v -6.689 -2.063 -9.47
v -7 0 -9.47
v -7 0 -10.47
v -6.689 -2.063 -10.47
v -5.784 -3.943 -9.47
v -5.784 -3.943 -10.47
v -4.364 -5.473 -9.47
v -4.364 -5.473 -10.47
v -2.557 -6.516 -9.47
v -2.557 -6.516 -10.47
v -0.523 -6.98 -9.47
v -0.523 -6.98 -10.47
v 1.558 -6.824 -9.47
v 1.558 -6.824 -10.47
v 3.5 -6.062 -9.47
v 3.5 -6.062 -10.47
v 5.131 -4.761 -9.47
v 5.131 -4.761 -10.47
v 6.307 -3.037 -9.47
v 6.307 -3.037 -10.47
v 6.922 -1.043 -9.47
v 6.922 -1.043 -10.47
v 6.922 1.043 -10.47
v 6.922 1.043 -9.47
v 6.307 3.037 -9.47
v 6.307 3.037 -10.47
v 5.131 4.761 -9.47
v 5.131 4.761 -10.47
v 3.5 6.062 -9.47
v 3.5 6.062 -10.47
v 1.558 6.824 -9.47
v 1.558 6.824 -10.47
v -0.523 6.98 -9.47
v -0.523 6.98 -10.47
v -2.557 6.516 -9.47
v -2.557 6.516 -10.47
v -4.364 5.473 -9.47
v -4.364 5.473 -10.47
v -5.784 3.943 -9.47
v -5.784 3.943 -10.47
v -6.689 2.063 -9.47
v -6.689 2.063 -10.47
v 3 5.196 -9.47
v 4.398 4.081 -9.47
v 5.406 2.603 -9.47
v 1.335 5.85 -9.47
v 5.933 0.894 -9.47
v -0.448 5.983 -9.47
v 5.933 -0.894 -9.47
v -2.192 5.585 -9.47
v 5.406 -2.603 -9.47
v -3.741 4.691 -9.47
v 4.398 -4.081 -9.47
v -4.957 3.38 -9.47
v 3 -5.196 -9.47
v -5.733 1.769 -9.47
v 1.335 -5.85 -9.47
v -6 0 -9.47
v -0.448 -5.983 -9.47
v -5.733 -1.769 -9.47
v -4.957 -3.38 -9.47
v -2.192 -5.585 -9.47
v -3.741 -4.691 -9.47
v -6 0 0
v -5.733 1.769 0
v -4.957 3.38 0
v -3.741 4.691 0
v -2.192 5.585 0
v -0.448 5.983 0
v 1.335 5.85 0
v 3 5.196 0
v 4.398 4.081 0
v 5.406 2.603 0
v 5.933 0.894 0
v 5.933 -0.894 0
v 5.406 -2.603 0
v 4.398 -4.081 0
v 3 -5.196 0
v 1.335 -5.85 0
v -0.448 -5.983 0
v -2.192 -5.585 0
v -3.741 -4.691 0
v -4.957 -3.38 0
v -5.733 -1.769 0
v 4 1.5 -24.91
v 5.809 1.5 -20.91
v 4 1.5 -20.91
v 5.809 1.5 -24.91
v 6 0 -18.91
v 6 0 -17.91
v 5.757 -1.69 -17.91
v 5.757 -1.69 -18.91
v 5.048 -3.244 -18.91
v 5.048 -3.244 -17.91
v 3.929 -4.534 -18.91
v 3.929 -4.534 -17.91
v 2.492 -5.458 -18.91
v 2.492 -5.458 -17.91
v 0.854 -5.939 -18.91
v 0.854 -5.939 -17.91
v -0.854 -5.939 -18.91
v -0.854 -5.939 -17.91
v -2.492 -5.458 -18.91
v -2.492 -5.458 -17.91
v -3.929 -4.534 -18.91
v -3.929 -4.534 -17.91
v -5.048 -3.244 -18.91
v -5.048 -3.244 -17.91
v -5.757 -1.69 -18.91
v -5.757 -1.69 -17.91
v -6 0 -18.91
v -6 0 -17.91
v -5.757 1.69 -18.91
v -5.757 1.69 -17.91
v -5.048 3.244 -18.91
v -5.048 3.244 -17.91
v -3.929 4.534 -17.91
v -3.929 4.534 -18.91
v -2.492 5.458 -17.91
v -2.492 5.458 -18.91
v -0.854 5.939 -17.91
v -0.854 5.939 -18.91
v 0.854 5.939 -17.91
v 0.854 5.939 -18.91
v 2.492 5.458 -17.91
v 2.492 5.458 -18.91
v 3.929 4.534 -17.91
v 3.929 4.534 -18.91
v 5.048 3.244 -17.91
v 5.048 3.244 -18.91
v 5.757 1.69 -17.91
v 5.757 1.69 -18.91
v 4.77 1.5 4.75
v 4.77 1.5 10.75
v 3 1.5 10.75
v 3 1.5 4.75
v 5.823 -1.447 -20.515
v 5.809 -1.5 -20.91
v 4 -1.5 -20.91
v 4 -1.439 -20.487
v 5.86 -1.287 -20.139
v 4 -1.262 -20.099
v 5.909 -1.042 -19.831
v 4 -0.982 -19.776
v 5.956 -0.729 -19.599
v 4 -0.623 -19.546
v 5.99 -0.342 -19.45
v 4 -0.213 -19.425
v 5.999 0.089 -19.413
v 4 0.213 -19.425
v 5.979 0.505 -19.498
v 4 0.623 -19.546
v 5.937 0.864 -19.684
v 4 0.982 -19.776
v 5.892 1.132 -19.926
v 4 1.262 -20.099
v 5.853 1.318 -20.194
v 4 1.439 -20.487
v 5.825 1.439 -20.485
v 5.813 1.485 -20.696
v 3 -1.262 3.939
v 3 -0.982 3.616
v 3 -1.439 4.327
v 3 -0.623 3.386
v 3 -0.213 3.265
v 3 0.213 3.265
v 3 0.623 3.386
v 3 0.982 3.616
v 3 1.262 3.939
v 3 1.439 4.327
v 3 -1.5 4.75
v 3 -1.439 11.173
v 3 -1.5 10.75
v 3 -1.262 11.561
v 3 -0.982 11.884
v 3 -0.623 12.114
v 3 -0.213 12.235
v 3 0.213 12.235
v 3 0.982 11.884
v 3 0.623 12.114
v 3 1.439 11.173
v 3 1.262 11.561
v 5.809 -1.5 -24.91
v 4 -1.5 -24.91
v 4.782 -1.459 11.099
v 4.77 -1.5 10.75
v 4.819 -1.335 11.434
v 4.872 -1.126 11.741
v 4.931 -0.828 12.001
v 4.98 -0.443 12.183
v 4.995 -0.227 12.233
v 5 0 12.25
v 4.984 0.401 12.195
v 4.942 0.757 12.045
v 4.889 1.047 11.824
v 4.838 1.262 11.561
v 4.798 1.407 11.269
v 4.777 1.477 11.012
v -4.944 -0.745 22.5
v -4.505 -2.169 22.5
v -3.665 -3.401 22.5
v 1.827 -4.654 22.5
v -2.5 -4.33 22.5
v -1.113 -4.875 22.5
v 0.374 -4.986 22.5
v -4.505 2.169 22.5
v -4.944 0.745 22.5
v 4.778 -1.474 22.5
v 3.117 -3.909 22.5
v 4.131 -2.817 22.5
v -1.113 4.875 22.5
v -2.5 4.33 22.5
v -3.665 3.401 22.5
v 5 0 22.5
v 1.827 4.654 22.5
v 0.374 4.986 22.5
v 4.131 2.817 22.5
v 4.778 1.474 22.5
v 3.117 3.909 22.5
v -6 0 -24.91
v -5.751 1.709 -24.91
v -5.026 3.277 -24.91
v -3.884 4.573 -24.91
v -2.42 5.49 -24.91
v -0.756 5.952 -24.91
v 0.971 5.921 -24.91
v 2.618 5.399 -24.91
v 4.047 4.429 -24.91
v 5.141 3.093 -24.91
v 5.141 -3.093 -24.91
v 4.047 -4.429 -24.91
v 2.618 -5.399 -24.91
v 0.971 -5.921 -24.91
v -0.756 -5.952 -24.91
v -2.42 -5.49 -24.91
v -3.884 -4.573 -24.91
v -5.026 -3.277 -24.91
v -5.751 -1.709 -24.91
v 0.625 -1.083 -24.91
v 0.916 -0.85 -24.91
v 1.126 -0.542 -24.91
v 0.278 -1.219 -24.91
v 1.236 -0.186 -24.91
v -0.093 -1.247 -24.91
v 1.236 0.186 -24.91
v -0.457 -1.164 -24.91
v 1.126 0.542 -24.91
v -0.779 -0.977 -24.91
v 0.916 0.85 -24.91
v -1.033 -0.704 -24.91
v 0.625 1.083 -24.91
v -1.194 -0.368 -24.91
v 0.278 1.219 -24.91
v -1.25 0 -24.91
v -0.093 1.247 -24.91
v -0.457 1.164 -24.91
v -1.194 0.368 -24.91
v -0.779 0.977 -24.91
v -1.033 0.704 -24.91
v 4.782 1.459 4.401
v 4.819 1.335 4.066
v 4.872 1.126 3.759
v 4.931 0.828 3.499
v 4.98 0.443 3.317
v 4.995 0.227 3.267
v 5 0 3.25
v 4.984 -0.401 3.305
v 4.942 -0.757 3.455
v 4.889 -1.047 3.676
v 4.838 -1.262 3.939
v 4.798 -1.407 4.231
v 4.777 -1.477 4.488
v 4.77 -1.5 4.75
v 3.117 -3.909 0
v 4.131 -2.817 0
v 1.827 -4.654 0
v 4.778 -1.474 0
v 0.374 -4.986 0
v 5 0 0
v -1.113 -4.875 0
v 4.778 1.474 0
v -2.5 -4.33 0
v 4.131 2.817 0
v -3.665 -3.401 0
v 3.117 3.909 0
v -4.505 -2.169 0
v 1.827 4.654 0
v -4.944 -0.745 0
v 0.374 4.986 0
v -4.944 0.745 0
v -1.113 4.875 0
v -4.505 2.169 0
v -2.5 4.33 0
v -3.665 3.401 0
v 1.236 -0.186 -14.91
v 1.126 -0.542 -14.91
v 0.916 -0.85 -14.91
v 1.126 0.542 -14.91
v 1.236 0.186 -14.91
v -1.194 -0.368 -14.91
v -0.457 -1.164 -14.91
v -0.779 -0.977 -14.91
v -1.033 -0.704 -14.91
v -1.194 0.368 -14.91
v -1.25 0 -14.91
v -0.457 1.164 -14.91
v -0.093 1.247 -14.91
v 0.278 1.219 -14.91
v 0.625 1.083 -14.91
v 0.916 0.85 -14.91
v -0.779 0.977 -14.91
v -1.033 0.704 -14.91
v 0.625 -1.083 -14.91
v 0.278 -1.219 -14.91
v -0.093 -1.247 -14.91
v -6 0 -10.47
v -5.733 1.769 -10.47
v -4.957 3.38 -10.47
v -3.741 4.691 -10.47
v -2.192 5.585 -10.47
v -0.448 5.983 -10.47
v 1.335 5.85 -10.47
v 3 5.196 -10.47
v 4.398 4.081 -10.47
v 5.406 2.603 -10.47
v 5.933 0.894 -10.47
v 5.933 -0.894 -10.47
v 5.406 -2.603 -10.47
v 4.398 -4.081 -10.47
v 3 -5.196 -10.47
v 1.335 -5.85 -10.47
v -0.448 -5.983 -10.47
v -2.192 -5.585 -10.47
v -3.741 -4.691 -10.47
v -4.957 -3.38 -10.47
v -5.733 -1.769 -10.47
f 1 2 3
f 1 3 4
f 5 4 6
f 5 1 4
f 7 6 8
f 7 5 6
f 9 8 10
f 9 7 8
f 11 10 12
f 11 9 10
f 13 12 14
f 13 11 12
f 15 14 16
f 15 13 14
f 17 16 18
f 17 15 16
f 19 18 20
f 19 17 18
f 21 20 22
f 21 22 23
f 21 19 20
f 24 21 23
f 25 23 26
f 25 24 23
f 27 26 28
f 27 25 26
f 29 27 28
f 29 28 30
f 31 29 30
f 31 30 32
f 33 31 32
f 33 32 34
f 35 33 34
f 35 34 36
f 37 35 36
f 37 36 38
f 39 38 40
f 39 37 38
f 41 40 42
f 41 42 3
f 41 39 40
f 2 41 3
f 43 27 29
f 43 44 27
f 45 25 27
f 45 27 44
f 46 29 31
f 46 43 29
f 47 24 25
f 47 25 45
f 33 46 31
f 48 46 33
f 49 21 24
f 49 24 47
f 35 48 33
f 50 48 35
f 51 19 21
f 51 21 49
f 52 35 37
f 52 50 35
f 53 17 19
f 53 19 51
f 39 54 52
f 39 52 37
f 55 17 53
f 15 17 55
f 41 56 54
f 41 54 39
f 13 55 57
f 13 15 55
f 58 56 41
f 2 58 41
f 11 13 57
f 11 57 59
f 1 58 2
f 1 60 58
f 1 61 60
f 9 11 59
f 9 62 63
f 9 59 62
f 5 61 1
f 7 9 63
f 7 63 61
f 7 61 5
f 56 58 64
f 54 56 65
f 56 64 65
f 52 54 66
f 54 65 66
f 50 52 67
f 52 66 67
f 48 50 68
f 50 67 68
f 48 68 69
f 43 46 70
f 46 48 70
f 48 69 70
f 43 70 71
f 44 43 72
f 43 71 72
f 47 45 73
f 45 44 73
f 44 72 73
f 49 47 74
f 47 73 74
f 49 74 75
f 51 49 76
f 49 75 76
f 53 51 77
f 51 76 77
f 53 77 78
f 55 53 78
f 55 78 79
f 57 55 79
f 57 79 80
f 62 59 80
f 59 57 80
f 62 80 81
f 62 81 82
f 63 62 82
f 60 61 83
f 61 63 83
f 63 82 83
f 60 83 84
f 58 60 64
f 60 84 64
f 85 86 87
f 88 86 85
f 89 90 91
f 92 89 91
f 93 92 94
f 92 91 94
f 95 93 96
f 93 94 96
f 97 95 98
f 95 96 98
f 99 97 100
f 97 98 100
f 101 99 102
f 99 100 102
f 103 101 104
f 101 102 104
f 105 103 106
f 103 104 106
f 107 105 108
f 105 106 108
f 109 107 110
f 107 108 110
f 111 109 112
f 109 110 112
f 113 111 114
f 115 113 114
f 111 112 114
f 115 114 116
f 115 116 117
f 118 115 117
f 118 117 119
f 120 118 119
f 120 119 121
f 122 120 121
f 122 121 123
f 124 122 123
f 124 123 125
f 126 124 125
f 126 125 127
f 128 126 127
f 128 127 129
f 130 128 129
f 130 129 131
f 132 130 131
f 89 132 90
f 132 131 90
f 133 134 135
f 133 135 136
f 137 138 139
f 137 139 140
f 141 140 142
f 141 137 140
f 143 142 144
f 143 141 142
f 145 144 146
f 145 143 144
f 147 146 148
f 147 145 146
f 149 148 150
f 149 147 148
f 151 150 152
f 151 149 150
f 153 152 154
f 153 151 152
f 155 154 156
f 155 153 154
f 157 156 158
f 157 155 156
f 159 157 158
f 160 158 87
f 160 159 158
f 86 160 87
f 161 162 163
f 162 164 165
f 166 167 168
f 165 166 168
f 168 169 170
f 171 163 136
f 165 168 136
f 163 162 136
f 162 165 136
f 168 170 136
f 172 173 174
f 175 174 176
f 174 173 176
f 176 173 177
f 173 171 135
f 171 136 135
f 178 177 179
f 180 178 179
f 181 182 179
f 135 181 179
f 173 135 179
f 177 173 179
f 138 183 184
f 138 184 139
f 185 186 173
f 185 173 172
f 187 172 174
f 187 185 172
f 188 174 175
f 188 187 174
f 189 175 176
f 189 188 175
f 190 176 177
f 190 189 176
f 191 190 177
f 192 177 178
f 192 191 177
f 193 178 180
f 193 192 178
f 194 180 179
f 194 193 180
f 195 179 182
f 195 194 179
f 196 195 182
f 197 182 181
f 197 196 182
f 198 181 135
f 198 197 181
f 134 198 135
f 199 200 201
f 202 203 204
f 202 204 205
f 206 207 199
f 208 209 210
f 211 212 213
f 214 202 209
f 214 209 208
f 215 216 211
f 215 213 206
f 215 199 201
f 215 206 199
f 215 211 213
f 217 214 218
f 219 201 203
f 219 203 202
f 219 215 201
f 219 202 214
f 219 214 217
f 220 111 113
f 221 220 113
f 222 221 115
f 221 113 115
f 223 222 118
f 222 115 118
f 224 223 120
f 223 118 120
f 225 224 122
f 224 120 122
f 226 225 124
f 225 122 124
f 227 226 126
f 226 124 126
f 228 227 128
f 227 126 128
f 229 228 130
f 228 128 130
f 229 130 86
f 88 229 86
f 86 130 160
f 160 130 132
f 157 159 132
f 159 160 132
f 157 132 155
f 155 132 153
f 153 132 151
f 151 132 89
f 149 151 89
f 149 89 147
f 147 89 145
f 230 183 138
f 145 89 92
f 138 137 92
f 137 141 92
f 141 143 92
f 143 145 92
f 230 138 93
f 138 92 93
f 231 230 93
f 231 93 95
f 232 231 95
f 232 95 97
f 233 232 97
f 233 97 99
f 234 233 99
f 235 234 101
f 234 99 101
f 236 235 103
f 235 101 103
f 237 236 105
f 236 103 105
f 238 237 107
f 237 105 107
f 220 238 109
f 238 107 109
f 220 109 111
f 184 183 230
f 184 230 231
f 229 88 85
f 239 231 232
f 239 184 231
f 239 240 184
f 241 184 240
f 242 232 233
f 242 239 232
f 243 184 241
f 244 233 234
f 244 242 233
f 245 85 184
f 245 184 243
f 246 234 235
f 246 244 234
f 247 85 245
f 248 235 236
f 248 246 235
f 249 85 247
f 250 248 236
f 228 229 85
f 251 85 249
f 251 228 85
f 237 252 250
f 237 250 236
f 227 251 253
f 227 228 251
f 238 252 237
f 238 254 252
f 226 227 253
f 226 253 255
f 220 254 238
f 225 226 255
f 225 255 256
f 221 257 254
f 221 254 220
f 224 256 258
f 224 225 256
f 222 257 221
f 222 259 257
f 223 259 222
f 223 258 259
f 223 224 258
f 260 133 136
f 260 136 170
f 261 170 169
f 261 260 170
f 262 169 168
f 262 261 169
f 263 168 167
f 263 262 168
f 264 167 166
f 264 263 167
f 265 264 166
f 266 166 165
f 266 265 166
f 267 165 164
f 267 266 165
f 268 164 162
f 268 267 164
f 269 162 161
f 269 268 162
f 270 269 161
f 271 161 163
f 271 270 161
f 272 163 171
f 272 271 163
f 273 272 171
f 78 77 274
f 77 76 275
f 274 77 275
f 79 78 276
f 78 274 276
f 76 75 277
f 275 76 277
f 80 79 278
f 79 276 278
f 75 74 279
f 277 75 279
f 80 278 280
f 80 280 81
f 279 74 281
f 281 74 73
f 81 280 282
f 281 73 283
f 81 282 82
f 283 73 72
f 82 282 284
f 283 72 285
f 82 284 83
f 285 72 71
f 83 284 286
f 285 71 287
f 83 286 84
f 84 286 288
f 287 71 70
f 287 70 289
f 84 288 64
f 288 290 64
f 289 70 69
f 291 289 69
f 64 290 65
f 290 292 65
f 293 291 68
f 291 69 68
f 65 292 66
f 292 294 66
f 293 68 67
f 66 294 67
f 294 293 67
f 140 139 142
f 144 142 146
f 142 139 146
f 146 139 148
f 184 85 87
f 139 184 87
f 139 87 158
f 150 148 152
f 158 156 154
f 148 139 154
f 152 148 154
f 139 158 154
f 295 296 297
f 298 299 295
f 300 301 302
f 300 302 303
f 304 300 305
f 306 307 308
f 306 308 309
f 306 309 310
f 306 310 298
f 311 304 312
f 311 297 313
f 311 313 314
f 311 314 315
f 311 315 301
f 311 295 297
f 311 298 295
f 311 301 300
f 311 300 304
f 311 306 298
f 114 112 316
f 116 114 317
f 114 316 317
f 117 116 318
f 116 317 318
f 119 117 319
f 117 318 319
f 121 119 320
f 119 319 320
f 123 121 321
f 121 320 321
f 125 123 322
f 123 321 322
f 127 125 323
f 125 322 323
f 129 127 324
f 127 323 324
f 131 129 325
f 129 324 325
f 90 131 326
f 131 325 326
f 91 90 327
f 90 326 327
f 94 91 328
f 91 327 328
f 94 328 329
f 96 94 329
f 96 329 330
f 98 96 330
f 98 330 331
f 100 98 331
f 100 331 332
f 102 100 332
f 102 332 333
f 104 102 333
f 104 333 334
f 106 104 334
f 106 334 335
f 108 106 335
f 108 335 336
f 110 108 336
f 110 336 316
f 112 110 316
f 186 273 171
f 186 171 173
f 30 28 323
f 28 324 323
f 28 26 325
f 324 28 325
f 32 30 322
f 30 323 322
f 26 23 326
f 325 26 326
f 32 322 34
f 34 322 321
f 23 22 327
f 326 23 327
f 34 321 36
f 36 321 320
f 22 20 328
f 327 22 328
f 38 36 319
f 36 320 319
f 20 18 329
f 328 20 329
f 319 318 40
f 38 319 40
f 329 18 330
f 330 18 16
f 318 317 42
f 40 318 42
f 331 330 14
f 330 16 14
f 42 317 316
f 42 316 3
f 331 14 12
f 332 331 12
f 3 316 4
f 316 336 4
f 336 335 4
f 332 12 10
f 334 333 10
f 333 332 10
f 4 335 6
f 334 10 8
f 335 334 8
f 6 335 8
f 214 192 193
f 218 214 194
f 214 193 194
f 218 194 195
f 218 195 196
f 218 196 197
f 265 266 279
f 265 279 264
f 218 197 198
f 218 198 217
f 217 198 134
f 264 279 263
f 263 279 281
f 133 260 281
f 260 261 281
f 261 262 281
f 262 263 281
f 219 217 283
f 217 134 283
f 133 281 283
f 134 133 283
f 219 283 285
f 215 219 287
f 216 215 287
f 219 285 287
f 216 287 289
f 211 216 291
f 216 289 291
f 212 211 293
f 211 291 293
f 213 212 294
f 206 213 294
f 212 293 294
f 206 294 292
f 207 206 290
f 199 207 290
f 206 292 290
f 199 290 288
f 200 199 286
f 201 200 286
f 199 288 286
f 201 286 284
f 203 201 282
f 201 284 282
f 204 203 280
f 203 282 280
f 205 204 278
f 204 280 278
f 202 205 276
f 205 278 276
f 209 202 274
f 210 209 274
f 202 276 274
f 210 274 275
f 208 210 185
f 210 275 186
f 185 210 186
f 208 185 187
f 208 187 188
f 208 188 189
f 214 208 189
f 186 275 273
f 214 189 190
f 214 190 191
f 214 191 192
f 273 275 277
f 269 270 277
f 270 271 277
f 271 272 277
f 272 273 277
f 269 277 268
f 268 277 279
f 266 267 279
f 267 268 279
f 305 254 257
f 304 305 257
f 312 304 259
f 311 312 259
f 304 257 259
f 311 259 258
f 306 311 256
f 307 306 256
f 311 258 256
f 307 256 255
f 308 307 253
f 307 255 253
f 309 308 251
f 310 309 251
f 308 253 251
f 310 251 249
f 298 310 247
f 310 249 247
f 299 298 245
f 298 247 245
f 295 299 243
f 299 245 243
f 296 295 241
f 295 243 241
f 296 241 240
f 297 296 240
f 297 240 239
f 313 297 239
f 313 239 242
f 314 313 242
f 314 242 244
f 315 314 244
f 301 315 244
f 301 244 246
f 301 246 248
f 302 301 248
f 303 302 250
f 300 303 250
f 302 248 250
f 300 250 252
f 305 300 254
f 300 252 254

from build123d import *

# Parameters (mm, degrees)
SKETCH_1_R          = 5
EXTRUDE_1_DEPTH     = 15.5
SKETCH_2_R          = 6
EXTRUDE_2_DEPTH     = 17.91
CUT_EXTRUDE_1_DEPTH = 2
SKETCH_4_R          = 5
EXTRUDE_3_DEPTH     = 7
SKETCH_5_R          = 7
EXTRUDE_4_DEPTH     = 1
SKETCH_6_R          = 6
EXTRUDE_5_DEPTH     = 6
CUT_EXTRUDE_2_DEPTH = 2
SKETCH_8_R          = 1.25
CUT_EXTRUDE_3_DEPTH = 10
EXTRUDE_START       = 1
SKETCH_9_R          = 7
EXTRUDE_6_DEPTH     = 1
CUT_EXTRUDE_START   = -1
SKETCH_10_R         = 7
SKETCH_10_R_2       = 6
CUT_EXTRUDE_5_DEPTH = 1


with BuildPart() as part:
    # 草图1 → 凸台-拉伸1 (new body)
    with BuildSketch(Plane.XY):
        Circle(SKETCH_1_R)
    extrude(amount=EXTRUDE_1_DEPTH)

    # 草图2 → 凸台-拉伸2 (add)
    with BuildSketch(Plane(origin=(0, 0, 0), x_dir=(-1, 0, 0), z_dir=(0, 0, -1))):
        Circle(SKETCH_2_R)
    extrude(amount=EXTRUDE_2_DEPTH)

    # 草图3 → 切除-拉伸1 (cut)
    with BuildSketch(Plane(origin=(5, 0, 0), x_dir=(0, 0, -1), z_dir=(1, 0, 0))):
        with BuildLine():
            Line((-10.75, 1.5), (-4.75, 1.5))
            ThreePointArc((-4.75, 1.5), (-3.25, 0), (-4.75, -1.5))
            Line((-4.75, -1.5), (-10.75, -1.5))
            ThreePointArc((-10.75, -1.5), (-12.25, 0), (-10.75, 1.5))
        make_face()
    extrude(amount=-CUT_EXTRUDE_1_DEPTH, mode=Mode.SUBTRACT)

    # 草图4 → 凸台-拉伸3 (add)
    with BuildSketch(Plane.XY.offset(15.5)):
        Circle(SKETCH_4_R)
    extrude(amount=EXTRUDE_3_DEPTH)

    # 草图5 → 凸台-拉伸4 (add)
    with BuildSketch(Plane(origin=(0, 0, -17.91), x_dir=(-1, 0, 0), z_dir=(0, 0, -1))):
        Circle(SKETCH_5_R)
    extrude(amount=EXTRUDE_4_DEPTH)

    # 草图6 → 凸台-拉伸5 (add)
    with BuildSketch(Plane(origin=(0, 0, -18.91), x_dir=(-1, 0, 0), z_dir=(0, 0, -1))):
        Circle(SKETCH_6_R)
    extrude(amount=EXTRUDE_5_DEPTH)

    # 草图7 → 切除-拉伸2 (cut)
    with BuildSketch(Plane(origin=(6, 0, 0), x_dir=(0, 0, -1), z_dir=(1, 0, 0))):
        with BuildLine():
            Line((20.91, 1.5), (24.91, 1.5))
            ThreePointArc((24.91, 1.5), (26.41, 0), (24.91, -1.5))
            Line((24.91, -1.5), (20.91, -1.5))
            ThreePointArc((20.91, -1.5), (19.41, 0), (20.91, 1.5))
        make_face()
    extrude(amount=-CUT_EXTRUDE_2_DEPTH, mode=Mode.SUBTRACT)

    # 草图8 → 切除-拉伸3 (cut)
    with BuildSketch(Plane(origin=(0, 0, -24.91), x_dir=(-1, 0, 0), z_dir=(0, 0, -1))):
        Circle(SKETCH_8_R)
    extrude(amount=-CUT_EXTRUDE_3_DEPTH, mode=Mode.SUBTRACT)

    # 草图9 → 凸台-拉伸6 (add)
    with BuildSketch(Plane.XY.offset(-10.47).offset(EXTRUDE_START)):
        with Locations(Location((0, 0, 0), (0, 0, 180))):
            Circle(SKETCH_9_R)
    extrude(amount=-EXTRUDE_6_DEPTH)

    # 草图10 → 切除-拉伸5 (cut)
    with BuildSketch(Plane(origin=(0, 0, -18.91), x_dir=(-1, 0, 0), z_dir=(0, 0, -1)).offset(CUT_EXTRUDE_START)):
        with Locations(Location((0, 0, 0), (0, 0, 180))):
            Circle(SKETCH_10_R)
        with Locations(Location((0, 0, 0), (0, 0, 180))):
            Circle(SKETCH_10_R_2, mode=Mode.SUBTRACT)
    extrude(amount=CUT_EXTRUDE_5_DEPTH, mode=Mode.SUBTRACT)


solid = part.part
